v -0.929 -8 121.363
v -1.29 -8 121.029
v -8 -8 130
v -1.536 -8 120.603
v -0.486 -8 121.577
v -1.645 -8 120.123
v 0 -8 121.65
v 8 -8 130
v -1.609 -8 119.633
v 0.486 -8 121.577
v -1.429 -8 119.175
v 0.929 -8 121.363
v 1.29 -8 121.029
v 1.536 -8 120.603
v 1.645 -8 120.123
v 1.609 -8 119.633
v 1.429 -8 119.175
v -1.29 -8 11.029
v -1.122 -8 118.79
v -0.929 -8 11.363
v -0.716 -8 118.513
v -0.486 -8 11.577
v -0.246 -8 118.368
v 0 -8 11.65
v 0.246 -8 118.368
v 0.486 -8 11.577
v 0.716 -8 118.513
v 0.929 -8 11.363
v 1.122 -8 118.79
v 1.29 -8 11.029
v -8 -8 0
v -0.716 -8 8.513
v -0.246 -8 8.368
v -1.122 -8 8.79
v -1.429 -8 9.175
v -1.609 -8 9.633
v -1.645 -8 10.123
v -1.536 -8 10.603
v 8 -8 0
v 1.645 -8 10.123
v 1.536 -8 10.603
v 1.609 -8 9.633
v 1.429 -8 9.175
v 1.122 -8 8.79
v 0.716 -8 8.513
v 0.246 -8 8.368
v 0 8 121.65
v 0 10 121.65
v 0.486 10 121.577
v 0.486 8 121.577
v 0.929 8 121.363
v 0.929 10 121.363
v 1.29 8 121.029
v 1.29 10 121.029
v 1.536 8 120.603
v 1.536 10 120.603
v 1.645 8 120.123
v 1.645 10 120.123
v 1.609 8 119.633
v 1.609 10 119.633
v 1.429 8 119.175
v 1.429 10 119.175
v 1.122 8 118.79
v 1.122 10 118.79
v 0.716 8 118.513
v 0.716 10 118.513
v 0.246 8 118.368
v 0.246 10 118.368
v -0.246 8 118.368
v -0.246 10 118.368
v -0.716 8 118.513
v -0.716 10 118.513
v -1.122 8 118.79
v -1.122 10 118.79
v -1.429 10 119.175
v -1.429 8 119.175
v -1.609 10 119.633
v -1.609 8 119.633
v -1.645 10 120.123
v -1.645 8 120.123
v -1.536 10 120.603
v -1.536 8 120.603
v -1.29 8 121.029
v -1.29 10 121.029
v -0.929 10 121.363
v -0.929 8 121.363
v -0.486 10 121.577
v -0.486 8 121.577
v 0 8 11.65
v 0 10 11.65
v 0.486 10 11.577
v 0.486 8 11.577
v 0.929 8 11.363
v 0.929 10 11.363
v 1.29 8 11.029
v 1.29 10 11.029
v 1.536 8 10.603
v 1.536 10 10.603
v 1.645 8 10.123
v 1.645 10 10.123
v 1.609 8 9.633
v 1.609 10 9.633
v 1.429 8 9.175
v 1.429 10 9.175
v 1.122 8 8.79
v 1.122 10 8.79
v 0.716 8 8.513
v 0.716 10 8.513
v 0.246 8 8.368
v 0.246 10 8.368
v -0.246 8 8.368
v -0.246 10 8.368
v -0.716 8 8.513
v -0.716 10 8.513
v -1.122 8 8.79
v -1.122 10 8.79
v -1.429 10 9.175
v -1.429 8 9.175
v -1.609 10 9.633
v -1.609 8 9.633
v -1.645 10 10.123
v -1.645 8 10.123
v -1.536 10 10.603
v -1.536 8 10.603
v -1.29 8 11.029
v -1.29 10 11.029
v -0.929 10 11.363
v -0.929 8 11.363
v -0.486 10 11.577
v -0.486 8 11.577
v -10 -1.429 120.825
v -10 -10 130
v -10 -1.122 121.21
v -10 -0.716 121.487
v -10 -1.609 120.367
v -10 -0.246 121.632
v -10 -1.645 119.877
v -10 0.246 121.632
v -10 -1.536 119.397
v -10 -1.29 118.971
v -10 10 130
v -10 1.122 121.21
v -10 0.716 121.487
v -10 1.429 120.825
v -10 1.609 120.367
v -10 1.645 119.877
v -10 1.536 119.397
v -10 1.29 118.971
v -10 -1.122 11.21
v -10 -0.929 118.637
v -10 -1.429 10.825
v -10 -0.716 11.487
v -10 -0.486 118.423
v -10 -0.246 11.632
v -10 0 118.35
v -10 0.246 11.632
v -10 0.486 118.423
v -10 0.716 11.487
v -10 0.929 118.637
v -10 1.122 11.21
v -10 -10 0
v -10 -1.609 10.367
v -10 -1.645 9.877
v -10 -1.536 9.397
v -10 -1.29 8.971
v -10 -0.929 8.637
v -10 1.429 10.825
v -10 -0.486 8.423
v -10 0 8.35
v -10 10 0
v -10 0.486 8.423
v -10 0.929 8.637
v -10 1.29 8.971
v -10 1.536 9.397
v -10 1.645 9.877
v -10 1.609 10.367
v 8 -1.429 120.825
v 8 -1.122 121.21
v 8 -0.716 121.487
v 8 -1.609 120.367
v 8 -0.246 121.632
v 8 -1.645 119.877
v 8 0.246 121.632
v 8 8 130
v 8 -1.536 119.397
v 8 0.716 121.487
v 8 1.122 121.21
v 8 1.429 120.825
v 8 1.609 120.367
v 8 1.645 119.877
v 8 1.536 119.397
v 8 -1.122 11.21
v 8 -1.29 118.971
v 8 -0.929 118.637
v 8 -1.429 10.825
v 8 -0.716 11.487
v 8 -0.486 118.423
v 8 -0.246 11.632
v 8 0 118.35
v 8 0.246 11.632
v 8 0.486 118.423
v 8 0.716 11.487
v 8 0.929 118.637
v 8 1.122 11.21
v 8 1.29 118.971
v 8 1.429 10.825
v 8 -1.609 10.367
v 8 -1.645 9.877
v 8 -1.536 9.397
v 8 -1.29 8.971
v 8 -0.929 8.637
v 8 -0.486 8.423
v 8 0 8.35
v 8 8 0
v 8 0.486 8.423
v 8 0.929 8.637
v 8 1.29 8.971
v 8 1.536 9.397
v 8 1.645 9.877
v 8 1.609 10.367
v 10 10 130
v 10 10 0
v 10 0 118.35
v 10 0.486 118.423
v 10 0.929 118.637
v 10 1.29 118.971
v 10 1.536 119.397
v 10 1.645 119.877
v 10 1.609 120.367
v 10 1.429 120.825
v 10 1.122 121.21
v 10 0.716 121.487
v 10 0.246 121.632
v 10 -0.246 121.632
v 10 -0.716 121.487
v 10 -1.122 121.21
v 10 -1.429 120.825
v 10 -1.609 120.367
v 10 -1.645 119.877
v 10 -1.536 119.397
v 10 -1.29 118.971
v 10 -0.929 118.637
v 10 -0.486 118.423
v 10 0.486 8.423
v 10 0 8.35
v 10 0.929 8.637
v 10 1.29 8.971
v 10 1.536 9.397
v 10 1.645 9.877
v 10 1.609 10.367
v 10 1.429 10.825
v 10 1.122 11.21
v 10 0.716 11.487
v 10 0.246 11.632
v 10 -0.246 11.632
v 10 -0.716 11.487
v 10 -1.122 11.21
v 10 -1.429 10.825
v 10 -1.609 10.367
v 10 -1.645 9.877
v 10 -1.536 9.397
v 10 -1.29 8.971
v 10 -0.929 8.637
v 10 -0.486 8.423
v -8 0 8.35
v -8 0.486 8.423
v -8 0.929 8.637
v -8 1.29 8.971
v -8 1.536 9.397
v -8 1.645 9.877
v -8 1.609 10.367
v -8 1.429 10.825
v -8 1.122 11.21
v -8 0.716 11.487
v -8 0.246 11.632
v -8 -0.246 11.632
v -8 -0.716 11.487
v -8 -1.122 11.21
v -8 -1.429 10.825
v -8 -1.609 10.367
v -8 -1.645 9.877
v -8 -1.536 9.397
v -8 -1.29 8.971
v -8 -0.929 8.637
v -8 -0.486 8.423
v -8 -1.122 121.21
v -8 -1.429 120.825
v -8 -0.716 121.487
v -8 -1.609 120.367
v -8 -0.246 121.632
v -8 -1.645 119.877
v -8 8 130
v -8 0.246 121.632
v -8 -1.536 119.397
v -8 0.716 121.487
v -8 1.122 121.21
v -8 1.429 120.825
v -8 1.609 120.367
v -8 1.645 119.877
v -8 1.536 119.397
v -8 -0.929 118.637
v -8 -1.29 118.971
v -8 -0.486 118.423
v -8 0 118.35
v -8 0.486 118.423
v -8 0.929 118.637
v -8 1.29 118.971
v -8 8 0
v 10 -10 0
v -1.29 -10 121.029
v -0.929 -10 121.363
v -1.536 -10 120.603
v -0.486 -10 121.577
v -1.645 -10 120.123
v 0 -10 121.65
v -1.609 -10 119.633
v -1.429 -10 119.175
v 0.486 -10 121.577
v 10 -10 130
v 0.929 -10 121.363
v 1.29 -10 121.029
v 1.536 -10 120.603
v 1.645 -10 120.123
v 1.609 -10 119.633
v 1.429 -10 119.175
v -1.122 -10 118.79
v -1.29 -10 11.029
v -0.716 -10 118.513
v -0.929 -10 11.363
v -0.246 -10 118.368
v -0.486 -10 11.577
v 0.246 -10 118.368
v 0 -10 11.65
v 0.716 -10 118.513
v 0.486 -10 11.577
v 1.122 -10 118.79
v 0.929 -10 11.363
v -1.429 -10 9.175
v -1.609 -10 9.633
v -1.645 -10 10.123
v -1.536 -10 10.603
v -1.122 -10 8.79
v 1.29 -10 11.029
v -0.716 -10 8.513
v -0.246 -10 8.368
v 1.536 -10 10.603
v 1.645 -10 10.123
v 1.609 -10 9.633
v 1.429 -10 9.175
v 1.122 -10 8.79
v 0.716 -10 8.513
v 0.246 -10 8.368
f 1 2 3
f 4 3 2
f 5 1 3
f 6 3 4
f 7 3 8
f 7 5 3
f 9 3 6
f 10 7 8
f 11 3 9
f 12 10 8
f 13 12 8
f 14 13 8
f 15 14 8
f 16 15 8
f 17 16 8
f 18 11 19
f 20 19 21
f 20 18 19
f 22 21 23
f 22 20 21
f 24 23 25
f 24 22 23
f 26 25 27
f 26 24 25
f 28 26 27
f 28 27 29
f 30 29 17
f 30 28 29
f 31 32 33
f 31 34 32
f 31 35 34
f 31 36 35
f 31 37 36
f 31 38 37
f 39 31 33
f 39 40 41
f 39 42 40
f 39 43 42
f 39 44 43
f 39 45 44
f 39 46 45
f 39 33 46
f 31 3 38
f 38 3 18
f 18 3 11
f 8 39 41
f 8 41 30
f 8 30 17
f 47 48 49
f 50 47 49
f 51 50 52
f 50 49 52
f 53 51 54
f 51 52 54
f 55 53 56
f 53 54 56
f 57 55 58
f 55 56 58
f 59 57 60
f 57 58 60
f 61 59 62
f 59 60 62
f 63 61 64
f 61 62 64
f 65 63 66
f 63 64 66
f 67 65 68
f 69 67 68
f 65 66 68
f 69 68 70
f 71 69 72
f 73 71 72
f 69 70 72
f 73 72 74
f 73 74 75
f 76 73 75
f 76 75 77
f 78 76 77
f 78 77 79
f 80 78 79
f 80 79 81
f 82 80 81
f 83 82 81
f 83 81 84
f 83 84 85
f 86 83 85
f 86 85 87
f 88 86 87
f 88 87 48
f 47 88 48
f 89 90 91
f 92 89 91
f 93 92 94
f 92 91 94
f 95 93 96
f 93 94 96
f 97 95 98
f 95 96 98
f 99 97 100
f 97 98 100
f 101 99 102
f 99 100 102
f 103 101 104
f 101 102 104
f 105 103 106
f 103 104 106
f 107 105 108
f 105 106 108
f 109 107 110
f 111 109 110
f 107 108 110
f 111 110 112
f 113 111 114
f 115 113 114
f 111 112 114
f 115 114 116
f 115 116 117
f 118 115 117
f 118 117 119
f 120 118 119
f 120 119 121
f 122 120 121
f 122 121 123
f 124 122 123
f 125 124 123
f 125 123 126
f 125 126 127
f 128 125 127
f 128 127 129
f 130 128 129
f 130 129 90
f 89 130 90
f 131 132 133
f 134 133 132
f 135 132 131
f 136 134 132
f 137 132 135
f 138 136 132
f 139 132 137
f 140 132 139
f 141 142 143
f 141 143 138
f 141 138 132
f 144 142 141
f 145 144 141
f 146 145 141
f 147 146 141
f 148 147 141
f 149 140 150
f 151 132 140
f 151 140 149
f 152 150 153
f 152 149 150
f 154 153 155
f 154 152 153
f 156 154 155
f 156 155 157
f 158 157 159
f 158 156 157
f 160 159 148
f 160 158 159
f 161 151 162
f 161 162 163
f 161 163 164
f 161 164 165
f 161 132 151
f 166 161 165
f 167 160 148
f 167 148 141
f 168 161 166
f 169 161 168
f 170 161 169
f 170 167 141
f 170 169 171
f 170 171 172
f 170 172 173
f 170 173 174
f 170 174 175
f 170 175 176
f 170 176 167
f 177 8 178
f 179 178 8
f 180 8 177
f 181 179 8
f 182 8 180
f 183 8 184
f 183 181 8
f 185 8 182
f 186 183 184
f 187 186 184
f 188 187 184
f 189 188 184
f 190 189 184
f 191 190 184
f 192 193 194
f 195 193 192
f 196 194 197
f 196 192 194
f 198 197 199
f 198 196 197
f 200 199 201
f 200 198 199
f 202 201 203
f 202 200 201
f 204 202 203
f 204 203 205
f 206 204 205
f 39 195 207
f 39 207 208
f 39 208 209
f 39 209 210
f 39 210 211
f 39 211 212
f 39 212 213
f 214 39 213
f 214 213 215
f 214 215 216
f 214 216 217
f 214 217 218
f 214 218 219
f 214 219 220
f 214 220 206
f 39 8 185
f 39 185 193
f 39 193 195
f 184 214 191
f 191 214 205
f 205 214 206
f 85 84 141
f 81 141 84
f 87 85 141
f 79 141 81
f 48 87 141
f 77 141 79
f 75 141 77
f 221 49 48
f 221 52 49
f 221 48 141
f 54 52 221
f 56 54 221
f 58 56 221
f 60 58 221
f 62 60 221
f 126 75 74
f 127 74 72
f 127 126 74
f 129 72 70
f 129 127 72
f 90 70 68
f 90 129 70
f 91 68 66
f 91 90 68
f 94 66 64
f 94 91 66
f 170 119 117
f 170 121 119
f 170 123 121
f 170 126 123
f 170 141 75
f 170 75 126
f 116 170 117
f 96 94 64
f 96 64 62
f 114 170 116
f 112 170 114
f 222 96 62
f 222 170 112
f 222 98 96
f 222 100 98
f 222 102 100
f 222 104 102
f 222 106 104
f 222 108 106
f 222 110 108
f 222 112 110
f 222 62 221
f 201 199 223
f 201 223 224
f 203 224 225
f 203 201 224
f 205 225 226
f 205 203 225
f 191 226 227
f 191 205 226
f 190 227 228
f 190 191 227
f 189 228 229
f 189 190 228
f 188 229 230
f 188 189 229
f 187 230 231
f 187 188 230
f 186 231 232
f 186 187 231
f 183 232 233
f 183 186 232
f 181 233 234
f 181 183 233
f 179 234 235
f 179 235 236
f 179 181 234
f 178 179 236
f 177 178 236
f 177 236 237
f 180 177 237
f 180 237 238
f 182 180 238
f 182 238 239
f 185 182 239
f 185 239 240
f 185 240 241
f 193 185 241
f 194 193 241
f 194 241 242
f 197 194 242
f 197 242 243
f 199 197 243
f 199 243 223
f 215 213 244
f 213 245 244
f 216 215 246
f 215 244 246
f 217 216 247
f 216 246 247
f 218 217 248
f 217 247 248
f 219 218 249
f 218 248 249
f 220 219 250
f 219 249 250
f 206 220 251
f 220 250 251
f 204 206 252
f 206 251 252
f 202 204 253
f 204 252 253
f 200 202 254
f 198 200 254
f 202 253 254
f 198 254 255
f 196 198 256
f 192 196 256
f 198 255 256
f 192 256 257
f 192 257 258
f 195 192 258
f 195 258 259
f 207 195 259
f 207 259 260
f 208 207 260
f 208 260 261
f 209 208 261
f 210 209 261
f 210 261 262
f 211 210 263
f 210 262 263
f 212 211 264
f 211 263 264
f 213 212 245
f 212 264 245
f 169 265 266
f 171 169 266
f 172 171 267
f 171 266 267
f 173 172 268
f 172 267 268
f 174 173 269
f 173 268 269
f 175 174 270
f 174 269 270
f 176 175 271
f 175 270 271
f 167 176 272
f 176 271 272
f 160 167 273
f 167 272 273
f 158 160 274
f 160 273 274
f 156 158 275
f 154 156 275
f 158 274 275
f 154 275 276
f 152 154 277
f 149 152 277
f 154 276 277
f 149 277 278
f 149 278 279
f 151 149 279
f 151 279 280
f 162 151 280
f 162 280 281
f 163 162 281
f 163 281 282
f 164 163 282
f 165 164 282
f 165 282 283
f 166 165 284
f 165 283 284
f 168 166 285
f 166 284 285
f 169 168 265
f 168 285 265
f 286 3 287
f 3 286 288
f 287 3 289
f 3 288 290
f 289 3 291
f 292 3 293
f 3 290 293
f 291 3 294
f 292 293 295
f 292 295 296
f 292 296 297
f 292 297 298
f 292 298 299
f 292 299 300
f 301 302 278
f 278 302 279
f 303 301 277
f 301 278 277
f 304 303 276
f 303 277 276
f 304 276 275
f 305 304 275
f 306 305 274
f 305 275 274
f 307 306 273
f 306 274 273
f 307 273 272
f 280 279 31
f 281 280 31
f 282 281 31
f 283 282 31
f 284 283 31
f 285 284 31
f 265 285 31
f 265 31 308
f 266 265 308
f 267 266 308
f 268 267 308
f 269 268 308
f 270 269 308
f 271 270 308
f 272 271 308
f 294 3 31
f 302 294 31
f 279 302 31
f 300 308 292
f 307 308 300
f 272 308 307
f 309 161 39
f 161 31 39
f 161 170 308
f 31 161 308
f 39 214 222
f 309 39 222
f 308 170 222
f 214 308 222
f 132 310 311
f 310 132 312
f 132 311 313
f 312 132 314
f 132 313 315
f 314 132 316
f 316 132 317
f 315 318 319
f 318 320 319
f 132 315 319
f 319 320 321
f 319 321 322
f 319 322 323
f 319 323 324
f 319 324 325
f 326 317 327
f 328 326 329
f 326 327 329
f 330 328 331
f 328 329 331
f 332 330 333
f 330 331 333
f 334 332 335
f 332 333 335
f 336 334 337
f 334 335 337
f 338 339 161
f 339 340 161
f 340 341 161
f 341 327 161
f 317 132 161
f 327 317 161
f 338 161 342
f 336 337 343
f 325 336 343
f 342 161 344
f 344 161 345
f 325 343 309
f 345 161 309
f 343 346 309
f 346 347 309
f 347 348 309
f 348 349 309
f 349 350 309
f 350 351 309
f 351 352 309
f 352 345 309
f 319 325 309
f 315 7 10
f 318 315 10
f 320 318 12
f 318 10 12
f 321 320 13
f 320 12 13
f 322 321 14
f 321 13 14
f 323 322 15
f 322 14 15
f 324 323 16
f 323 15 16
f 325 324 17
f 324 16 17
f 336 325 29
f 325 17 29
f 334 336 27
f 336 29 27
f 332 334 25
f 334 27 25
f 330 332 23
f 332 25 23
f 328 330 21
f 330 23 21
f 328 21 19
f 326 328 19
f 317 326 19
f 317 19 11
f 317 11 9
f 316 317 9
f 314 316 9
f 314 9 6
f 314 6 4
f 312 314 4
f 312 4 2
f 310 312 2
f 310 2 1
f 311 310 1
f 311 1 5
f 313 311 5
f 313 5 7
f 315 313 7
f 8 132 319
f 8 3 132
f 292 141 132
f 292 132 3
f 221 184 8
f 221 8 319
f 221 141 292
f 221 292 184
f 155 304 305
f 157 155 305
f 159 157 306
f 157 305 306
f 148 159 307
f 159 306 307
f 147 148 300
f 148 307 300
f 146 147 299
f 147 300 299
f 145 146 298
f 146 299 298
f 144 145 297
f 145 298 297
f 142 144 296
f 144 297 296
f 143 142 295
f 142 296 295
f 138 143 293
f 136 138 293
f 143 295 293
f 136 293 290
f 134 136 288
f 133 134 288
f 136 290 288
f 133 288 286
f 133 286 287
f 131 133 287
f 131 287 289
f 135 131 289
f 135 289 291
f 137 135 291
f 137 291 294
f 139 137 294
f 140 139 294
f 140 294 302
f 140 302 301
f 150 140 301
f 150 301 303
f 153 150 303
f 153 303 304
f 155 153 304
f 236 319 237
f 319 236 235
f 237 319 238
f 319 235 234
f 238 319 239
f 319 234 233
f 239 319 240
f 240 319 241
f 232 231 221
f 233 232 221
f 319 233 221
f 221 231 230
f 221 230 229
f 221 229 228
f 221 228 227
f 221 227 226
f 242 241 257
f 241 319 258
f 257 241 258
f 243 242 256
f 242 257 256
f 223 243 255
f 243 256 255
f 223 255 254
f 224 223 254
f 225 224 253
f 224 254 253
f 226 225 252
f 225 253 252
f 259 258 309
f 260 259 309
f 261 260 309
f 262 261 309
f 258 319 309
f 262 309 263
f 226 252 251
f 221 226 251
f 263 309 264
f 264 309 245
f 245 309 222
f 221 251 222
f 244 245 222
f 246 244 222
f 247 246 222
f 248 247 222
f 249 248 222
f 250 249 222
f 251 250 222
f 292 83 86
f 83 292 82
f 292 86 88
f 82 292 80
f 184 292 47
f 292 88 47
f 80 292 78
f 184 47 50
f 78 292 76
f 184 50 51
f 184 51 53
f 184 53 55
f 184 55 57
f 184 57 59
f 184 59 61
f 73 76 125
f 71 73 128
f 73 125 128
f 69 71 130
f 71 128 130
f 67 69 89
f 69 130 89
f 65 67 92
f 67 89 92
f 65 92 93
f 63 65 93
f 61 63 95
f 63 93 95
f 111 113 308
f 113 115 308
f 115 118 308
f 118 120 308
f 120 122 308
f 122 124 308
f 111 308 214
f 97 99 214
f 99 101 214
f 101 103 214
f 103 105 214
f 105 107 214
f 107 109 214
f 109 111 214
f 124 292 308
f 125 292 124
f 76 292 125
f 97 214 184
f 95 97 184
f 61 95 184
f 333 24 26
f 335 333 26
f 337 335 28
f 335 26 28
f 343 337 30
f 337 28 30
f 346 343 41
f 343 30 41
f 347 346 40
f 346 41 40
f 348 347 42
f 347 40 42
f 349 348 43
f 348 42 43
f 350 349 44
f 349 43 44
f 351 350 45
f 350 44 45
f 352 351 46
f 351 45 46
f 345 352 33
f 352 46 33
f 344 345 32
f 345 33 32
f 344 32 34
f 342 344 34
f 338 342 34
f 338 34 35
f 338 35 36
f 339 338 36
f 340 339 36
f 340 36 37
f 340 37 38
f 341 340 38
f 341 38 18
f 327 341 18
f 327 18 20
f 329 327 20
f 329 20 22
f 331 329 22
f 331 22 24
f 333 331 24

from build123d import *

# Parameters (mm, degrees)
SKETCH_1_W          = 20
SKETCH_1_H          = 20
SKETCH_1_W_2        = 16
SKETCH_1_H_2        = 16
EXTRUDE_1_DEPTH     = 130
SKETCH_2_R          = 1.65
CUT_EXTRUDE_1_DEPTH = 30
SKETCH_3_R          = 1.65
CUT_EXTRUDE_2_DEPTH = 10


with BuildPart() as part:
    # 草图1 → 凸台-拉伸1 (new body)
    with BuildSketch(Plane.XY):
        Rectangle(SKETCH_1_W, SKETCH_1_H)
        Rectangle(SKETCH_1_W_2, SKETCH_1_H_2, mode=Mode.SUBTRACT)
    extrude(amount=EXTRUDE_1_DEPTH)

    # 草图2 → 切除-拉伸1 (cut)
    with BuildSketch(Plane(origin=(0, 10, 0), x_dir=(1, 0, 0), z_dir=(0, 1, 0))):
        with Locations(Location((0, -120, 0), (0, 0, 270))):
            Circle(SKETCH_2_R)
        with Locations(Location((0, -10, 0), (0, 0, 270))):
            Circle(SKETCH_2_R)
    extrude(amount=-CUT_EXTRUDE_1_DEPTH, mode=Mode.SUBTRACT)

    # 草图3 → 切除-拉伸2 (cut, symmetric)
    with BuildSketch(Plane(origin=(0, 0, 0), x_dir=(0, 0, -1), z_dir=(1, 0, 0))):
        with Locations((-120, 0)):
            Circle(SKETCH_3_R)
        with Locations((-10, 0)):
            Circle(SKETCH_3_R)
    extrude(amount=CUT_EXTRUDE_2_DEPTH, both=True, mode=Mode.SUBTRACT)


solid = part.part
